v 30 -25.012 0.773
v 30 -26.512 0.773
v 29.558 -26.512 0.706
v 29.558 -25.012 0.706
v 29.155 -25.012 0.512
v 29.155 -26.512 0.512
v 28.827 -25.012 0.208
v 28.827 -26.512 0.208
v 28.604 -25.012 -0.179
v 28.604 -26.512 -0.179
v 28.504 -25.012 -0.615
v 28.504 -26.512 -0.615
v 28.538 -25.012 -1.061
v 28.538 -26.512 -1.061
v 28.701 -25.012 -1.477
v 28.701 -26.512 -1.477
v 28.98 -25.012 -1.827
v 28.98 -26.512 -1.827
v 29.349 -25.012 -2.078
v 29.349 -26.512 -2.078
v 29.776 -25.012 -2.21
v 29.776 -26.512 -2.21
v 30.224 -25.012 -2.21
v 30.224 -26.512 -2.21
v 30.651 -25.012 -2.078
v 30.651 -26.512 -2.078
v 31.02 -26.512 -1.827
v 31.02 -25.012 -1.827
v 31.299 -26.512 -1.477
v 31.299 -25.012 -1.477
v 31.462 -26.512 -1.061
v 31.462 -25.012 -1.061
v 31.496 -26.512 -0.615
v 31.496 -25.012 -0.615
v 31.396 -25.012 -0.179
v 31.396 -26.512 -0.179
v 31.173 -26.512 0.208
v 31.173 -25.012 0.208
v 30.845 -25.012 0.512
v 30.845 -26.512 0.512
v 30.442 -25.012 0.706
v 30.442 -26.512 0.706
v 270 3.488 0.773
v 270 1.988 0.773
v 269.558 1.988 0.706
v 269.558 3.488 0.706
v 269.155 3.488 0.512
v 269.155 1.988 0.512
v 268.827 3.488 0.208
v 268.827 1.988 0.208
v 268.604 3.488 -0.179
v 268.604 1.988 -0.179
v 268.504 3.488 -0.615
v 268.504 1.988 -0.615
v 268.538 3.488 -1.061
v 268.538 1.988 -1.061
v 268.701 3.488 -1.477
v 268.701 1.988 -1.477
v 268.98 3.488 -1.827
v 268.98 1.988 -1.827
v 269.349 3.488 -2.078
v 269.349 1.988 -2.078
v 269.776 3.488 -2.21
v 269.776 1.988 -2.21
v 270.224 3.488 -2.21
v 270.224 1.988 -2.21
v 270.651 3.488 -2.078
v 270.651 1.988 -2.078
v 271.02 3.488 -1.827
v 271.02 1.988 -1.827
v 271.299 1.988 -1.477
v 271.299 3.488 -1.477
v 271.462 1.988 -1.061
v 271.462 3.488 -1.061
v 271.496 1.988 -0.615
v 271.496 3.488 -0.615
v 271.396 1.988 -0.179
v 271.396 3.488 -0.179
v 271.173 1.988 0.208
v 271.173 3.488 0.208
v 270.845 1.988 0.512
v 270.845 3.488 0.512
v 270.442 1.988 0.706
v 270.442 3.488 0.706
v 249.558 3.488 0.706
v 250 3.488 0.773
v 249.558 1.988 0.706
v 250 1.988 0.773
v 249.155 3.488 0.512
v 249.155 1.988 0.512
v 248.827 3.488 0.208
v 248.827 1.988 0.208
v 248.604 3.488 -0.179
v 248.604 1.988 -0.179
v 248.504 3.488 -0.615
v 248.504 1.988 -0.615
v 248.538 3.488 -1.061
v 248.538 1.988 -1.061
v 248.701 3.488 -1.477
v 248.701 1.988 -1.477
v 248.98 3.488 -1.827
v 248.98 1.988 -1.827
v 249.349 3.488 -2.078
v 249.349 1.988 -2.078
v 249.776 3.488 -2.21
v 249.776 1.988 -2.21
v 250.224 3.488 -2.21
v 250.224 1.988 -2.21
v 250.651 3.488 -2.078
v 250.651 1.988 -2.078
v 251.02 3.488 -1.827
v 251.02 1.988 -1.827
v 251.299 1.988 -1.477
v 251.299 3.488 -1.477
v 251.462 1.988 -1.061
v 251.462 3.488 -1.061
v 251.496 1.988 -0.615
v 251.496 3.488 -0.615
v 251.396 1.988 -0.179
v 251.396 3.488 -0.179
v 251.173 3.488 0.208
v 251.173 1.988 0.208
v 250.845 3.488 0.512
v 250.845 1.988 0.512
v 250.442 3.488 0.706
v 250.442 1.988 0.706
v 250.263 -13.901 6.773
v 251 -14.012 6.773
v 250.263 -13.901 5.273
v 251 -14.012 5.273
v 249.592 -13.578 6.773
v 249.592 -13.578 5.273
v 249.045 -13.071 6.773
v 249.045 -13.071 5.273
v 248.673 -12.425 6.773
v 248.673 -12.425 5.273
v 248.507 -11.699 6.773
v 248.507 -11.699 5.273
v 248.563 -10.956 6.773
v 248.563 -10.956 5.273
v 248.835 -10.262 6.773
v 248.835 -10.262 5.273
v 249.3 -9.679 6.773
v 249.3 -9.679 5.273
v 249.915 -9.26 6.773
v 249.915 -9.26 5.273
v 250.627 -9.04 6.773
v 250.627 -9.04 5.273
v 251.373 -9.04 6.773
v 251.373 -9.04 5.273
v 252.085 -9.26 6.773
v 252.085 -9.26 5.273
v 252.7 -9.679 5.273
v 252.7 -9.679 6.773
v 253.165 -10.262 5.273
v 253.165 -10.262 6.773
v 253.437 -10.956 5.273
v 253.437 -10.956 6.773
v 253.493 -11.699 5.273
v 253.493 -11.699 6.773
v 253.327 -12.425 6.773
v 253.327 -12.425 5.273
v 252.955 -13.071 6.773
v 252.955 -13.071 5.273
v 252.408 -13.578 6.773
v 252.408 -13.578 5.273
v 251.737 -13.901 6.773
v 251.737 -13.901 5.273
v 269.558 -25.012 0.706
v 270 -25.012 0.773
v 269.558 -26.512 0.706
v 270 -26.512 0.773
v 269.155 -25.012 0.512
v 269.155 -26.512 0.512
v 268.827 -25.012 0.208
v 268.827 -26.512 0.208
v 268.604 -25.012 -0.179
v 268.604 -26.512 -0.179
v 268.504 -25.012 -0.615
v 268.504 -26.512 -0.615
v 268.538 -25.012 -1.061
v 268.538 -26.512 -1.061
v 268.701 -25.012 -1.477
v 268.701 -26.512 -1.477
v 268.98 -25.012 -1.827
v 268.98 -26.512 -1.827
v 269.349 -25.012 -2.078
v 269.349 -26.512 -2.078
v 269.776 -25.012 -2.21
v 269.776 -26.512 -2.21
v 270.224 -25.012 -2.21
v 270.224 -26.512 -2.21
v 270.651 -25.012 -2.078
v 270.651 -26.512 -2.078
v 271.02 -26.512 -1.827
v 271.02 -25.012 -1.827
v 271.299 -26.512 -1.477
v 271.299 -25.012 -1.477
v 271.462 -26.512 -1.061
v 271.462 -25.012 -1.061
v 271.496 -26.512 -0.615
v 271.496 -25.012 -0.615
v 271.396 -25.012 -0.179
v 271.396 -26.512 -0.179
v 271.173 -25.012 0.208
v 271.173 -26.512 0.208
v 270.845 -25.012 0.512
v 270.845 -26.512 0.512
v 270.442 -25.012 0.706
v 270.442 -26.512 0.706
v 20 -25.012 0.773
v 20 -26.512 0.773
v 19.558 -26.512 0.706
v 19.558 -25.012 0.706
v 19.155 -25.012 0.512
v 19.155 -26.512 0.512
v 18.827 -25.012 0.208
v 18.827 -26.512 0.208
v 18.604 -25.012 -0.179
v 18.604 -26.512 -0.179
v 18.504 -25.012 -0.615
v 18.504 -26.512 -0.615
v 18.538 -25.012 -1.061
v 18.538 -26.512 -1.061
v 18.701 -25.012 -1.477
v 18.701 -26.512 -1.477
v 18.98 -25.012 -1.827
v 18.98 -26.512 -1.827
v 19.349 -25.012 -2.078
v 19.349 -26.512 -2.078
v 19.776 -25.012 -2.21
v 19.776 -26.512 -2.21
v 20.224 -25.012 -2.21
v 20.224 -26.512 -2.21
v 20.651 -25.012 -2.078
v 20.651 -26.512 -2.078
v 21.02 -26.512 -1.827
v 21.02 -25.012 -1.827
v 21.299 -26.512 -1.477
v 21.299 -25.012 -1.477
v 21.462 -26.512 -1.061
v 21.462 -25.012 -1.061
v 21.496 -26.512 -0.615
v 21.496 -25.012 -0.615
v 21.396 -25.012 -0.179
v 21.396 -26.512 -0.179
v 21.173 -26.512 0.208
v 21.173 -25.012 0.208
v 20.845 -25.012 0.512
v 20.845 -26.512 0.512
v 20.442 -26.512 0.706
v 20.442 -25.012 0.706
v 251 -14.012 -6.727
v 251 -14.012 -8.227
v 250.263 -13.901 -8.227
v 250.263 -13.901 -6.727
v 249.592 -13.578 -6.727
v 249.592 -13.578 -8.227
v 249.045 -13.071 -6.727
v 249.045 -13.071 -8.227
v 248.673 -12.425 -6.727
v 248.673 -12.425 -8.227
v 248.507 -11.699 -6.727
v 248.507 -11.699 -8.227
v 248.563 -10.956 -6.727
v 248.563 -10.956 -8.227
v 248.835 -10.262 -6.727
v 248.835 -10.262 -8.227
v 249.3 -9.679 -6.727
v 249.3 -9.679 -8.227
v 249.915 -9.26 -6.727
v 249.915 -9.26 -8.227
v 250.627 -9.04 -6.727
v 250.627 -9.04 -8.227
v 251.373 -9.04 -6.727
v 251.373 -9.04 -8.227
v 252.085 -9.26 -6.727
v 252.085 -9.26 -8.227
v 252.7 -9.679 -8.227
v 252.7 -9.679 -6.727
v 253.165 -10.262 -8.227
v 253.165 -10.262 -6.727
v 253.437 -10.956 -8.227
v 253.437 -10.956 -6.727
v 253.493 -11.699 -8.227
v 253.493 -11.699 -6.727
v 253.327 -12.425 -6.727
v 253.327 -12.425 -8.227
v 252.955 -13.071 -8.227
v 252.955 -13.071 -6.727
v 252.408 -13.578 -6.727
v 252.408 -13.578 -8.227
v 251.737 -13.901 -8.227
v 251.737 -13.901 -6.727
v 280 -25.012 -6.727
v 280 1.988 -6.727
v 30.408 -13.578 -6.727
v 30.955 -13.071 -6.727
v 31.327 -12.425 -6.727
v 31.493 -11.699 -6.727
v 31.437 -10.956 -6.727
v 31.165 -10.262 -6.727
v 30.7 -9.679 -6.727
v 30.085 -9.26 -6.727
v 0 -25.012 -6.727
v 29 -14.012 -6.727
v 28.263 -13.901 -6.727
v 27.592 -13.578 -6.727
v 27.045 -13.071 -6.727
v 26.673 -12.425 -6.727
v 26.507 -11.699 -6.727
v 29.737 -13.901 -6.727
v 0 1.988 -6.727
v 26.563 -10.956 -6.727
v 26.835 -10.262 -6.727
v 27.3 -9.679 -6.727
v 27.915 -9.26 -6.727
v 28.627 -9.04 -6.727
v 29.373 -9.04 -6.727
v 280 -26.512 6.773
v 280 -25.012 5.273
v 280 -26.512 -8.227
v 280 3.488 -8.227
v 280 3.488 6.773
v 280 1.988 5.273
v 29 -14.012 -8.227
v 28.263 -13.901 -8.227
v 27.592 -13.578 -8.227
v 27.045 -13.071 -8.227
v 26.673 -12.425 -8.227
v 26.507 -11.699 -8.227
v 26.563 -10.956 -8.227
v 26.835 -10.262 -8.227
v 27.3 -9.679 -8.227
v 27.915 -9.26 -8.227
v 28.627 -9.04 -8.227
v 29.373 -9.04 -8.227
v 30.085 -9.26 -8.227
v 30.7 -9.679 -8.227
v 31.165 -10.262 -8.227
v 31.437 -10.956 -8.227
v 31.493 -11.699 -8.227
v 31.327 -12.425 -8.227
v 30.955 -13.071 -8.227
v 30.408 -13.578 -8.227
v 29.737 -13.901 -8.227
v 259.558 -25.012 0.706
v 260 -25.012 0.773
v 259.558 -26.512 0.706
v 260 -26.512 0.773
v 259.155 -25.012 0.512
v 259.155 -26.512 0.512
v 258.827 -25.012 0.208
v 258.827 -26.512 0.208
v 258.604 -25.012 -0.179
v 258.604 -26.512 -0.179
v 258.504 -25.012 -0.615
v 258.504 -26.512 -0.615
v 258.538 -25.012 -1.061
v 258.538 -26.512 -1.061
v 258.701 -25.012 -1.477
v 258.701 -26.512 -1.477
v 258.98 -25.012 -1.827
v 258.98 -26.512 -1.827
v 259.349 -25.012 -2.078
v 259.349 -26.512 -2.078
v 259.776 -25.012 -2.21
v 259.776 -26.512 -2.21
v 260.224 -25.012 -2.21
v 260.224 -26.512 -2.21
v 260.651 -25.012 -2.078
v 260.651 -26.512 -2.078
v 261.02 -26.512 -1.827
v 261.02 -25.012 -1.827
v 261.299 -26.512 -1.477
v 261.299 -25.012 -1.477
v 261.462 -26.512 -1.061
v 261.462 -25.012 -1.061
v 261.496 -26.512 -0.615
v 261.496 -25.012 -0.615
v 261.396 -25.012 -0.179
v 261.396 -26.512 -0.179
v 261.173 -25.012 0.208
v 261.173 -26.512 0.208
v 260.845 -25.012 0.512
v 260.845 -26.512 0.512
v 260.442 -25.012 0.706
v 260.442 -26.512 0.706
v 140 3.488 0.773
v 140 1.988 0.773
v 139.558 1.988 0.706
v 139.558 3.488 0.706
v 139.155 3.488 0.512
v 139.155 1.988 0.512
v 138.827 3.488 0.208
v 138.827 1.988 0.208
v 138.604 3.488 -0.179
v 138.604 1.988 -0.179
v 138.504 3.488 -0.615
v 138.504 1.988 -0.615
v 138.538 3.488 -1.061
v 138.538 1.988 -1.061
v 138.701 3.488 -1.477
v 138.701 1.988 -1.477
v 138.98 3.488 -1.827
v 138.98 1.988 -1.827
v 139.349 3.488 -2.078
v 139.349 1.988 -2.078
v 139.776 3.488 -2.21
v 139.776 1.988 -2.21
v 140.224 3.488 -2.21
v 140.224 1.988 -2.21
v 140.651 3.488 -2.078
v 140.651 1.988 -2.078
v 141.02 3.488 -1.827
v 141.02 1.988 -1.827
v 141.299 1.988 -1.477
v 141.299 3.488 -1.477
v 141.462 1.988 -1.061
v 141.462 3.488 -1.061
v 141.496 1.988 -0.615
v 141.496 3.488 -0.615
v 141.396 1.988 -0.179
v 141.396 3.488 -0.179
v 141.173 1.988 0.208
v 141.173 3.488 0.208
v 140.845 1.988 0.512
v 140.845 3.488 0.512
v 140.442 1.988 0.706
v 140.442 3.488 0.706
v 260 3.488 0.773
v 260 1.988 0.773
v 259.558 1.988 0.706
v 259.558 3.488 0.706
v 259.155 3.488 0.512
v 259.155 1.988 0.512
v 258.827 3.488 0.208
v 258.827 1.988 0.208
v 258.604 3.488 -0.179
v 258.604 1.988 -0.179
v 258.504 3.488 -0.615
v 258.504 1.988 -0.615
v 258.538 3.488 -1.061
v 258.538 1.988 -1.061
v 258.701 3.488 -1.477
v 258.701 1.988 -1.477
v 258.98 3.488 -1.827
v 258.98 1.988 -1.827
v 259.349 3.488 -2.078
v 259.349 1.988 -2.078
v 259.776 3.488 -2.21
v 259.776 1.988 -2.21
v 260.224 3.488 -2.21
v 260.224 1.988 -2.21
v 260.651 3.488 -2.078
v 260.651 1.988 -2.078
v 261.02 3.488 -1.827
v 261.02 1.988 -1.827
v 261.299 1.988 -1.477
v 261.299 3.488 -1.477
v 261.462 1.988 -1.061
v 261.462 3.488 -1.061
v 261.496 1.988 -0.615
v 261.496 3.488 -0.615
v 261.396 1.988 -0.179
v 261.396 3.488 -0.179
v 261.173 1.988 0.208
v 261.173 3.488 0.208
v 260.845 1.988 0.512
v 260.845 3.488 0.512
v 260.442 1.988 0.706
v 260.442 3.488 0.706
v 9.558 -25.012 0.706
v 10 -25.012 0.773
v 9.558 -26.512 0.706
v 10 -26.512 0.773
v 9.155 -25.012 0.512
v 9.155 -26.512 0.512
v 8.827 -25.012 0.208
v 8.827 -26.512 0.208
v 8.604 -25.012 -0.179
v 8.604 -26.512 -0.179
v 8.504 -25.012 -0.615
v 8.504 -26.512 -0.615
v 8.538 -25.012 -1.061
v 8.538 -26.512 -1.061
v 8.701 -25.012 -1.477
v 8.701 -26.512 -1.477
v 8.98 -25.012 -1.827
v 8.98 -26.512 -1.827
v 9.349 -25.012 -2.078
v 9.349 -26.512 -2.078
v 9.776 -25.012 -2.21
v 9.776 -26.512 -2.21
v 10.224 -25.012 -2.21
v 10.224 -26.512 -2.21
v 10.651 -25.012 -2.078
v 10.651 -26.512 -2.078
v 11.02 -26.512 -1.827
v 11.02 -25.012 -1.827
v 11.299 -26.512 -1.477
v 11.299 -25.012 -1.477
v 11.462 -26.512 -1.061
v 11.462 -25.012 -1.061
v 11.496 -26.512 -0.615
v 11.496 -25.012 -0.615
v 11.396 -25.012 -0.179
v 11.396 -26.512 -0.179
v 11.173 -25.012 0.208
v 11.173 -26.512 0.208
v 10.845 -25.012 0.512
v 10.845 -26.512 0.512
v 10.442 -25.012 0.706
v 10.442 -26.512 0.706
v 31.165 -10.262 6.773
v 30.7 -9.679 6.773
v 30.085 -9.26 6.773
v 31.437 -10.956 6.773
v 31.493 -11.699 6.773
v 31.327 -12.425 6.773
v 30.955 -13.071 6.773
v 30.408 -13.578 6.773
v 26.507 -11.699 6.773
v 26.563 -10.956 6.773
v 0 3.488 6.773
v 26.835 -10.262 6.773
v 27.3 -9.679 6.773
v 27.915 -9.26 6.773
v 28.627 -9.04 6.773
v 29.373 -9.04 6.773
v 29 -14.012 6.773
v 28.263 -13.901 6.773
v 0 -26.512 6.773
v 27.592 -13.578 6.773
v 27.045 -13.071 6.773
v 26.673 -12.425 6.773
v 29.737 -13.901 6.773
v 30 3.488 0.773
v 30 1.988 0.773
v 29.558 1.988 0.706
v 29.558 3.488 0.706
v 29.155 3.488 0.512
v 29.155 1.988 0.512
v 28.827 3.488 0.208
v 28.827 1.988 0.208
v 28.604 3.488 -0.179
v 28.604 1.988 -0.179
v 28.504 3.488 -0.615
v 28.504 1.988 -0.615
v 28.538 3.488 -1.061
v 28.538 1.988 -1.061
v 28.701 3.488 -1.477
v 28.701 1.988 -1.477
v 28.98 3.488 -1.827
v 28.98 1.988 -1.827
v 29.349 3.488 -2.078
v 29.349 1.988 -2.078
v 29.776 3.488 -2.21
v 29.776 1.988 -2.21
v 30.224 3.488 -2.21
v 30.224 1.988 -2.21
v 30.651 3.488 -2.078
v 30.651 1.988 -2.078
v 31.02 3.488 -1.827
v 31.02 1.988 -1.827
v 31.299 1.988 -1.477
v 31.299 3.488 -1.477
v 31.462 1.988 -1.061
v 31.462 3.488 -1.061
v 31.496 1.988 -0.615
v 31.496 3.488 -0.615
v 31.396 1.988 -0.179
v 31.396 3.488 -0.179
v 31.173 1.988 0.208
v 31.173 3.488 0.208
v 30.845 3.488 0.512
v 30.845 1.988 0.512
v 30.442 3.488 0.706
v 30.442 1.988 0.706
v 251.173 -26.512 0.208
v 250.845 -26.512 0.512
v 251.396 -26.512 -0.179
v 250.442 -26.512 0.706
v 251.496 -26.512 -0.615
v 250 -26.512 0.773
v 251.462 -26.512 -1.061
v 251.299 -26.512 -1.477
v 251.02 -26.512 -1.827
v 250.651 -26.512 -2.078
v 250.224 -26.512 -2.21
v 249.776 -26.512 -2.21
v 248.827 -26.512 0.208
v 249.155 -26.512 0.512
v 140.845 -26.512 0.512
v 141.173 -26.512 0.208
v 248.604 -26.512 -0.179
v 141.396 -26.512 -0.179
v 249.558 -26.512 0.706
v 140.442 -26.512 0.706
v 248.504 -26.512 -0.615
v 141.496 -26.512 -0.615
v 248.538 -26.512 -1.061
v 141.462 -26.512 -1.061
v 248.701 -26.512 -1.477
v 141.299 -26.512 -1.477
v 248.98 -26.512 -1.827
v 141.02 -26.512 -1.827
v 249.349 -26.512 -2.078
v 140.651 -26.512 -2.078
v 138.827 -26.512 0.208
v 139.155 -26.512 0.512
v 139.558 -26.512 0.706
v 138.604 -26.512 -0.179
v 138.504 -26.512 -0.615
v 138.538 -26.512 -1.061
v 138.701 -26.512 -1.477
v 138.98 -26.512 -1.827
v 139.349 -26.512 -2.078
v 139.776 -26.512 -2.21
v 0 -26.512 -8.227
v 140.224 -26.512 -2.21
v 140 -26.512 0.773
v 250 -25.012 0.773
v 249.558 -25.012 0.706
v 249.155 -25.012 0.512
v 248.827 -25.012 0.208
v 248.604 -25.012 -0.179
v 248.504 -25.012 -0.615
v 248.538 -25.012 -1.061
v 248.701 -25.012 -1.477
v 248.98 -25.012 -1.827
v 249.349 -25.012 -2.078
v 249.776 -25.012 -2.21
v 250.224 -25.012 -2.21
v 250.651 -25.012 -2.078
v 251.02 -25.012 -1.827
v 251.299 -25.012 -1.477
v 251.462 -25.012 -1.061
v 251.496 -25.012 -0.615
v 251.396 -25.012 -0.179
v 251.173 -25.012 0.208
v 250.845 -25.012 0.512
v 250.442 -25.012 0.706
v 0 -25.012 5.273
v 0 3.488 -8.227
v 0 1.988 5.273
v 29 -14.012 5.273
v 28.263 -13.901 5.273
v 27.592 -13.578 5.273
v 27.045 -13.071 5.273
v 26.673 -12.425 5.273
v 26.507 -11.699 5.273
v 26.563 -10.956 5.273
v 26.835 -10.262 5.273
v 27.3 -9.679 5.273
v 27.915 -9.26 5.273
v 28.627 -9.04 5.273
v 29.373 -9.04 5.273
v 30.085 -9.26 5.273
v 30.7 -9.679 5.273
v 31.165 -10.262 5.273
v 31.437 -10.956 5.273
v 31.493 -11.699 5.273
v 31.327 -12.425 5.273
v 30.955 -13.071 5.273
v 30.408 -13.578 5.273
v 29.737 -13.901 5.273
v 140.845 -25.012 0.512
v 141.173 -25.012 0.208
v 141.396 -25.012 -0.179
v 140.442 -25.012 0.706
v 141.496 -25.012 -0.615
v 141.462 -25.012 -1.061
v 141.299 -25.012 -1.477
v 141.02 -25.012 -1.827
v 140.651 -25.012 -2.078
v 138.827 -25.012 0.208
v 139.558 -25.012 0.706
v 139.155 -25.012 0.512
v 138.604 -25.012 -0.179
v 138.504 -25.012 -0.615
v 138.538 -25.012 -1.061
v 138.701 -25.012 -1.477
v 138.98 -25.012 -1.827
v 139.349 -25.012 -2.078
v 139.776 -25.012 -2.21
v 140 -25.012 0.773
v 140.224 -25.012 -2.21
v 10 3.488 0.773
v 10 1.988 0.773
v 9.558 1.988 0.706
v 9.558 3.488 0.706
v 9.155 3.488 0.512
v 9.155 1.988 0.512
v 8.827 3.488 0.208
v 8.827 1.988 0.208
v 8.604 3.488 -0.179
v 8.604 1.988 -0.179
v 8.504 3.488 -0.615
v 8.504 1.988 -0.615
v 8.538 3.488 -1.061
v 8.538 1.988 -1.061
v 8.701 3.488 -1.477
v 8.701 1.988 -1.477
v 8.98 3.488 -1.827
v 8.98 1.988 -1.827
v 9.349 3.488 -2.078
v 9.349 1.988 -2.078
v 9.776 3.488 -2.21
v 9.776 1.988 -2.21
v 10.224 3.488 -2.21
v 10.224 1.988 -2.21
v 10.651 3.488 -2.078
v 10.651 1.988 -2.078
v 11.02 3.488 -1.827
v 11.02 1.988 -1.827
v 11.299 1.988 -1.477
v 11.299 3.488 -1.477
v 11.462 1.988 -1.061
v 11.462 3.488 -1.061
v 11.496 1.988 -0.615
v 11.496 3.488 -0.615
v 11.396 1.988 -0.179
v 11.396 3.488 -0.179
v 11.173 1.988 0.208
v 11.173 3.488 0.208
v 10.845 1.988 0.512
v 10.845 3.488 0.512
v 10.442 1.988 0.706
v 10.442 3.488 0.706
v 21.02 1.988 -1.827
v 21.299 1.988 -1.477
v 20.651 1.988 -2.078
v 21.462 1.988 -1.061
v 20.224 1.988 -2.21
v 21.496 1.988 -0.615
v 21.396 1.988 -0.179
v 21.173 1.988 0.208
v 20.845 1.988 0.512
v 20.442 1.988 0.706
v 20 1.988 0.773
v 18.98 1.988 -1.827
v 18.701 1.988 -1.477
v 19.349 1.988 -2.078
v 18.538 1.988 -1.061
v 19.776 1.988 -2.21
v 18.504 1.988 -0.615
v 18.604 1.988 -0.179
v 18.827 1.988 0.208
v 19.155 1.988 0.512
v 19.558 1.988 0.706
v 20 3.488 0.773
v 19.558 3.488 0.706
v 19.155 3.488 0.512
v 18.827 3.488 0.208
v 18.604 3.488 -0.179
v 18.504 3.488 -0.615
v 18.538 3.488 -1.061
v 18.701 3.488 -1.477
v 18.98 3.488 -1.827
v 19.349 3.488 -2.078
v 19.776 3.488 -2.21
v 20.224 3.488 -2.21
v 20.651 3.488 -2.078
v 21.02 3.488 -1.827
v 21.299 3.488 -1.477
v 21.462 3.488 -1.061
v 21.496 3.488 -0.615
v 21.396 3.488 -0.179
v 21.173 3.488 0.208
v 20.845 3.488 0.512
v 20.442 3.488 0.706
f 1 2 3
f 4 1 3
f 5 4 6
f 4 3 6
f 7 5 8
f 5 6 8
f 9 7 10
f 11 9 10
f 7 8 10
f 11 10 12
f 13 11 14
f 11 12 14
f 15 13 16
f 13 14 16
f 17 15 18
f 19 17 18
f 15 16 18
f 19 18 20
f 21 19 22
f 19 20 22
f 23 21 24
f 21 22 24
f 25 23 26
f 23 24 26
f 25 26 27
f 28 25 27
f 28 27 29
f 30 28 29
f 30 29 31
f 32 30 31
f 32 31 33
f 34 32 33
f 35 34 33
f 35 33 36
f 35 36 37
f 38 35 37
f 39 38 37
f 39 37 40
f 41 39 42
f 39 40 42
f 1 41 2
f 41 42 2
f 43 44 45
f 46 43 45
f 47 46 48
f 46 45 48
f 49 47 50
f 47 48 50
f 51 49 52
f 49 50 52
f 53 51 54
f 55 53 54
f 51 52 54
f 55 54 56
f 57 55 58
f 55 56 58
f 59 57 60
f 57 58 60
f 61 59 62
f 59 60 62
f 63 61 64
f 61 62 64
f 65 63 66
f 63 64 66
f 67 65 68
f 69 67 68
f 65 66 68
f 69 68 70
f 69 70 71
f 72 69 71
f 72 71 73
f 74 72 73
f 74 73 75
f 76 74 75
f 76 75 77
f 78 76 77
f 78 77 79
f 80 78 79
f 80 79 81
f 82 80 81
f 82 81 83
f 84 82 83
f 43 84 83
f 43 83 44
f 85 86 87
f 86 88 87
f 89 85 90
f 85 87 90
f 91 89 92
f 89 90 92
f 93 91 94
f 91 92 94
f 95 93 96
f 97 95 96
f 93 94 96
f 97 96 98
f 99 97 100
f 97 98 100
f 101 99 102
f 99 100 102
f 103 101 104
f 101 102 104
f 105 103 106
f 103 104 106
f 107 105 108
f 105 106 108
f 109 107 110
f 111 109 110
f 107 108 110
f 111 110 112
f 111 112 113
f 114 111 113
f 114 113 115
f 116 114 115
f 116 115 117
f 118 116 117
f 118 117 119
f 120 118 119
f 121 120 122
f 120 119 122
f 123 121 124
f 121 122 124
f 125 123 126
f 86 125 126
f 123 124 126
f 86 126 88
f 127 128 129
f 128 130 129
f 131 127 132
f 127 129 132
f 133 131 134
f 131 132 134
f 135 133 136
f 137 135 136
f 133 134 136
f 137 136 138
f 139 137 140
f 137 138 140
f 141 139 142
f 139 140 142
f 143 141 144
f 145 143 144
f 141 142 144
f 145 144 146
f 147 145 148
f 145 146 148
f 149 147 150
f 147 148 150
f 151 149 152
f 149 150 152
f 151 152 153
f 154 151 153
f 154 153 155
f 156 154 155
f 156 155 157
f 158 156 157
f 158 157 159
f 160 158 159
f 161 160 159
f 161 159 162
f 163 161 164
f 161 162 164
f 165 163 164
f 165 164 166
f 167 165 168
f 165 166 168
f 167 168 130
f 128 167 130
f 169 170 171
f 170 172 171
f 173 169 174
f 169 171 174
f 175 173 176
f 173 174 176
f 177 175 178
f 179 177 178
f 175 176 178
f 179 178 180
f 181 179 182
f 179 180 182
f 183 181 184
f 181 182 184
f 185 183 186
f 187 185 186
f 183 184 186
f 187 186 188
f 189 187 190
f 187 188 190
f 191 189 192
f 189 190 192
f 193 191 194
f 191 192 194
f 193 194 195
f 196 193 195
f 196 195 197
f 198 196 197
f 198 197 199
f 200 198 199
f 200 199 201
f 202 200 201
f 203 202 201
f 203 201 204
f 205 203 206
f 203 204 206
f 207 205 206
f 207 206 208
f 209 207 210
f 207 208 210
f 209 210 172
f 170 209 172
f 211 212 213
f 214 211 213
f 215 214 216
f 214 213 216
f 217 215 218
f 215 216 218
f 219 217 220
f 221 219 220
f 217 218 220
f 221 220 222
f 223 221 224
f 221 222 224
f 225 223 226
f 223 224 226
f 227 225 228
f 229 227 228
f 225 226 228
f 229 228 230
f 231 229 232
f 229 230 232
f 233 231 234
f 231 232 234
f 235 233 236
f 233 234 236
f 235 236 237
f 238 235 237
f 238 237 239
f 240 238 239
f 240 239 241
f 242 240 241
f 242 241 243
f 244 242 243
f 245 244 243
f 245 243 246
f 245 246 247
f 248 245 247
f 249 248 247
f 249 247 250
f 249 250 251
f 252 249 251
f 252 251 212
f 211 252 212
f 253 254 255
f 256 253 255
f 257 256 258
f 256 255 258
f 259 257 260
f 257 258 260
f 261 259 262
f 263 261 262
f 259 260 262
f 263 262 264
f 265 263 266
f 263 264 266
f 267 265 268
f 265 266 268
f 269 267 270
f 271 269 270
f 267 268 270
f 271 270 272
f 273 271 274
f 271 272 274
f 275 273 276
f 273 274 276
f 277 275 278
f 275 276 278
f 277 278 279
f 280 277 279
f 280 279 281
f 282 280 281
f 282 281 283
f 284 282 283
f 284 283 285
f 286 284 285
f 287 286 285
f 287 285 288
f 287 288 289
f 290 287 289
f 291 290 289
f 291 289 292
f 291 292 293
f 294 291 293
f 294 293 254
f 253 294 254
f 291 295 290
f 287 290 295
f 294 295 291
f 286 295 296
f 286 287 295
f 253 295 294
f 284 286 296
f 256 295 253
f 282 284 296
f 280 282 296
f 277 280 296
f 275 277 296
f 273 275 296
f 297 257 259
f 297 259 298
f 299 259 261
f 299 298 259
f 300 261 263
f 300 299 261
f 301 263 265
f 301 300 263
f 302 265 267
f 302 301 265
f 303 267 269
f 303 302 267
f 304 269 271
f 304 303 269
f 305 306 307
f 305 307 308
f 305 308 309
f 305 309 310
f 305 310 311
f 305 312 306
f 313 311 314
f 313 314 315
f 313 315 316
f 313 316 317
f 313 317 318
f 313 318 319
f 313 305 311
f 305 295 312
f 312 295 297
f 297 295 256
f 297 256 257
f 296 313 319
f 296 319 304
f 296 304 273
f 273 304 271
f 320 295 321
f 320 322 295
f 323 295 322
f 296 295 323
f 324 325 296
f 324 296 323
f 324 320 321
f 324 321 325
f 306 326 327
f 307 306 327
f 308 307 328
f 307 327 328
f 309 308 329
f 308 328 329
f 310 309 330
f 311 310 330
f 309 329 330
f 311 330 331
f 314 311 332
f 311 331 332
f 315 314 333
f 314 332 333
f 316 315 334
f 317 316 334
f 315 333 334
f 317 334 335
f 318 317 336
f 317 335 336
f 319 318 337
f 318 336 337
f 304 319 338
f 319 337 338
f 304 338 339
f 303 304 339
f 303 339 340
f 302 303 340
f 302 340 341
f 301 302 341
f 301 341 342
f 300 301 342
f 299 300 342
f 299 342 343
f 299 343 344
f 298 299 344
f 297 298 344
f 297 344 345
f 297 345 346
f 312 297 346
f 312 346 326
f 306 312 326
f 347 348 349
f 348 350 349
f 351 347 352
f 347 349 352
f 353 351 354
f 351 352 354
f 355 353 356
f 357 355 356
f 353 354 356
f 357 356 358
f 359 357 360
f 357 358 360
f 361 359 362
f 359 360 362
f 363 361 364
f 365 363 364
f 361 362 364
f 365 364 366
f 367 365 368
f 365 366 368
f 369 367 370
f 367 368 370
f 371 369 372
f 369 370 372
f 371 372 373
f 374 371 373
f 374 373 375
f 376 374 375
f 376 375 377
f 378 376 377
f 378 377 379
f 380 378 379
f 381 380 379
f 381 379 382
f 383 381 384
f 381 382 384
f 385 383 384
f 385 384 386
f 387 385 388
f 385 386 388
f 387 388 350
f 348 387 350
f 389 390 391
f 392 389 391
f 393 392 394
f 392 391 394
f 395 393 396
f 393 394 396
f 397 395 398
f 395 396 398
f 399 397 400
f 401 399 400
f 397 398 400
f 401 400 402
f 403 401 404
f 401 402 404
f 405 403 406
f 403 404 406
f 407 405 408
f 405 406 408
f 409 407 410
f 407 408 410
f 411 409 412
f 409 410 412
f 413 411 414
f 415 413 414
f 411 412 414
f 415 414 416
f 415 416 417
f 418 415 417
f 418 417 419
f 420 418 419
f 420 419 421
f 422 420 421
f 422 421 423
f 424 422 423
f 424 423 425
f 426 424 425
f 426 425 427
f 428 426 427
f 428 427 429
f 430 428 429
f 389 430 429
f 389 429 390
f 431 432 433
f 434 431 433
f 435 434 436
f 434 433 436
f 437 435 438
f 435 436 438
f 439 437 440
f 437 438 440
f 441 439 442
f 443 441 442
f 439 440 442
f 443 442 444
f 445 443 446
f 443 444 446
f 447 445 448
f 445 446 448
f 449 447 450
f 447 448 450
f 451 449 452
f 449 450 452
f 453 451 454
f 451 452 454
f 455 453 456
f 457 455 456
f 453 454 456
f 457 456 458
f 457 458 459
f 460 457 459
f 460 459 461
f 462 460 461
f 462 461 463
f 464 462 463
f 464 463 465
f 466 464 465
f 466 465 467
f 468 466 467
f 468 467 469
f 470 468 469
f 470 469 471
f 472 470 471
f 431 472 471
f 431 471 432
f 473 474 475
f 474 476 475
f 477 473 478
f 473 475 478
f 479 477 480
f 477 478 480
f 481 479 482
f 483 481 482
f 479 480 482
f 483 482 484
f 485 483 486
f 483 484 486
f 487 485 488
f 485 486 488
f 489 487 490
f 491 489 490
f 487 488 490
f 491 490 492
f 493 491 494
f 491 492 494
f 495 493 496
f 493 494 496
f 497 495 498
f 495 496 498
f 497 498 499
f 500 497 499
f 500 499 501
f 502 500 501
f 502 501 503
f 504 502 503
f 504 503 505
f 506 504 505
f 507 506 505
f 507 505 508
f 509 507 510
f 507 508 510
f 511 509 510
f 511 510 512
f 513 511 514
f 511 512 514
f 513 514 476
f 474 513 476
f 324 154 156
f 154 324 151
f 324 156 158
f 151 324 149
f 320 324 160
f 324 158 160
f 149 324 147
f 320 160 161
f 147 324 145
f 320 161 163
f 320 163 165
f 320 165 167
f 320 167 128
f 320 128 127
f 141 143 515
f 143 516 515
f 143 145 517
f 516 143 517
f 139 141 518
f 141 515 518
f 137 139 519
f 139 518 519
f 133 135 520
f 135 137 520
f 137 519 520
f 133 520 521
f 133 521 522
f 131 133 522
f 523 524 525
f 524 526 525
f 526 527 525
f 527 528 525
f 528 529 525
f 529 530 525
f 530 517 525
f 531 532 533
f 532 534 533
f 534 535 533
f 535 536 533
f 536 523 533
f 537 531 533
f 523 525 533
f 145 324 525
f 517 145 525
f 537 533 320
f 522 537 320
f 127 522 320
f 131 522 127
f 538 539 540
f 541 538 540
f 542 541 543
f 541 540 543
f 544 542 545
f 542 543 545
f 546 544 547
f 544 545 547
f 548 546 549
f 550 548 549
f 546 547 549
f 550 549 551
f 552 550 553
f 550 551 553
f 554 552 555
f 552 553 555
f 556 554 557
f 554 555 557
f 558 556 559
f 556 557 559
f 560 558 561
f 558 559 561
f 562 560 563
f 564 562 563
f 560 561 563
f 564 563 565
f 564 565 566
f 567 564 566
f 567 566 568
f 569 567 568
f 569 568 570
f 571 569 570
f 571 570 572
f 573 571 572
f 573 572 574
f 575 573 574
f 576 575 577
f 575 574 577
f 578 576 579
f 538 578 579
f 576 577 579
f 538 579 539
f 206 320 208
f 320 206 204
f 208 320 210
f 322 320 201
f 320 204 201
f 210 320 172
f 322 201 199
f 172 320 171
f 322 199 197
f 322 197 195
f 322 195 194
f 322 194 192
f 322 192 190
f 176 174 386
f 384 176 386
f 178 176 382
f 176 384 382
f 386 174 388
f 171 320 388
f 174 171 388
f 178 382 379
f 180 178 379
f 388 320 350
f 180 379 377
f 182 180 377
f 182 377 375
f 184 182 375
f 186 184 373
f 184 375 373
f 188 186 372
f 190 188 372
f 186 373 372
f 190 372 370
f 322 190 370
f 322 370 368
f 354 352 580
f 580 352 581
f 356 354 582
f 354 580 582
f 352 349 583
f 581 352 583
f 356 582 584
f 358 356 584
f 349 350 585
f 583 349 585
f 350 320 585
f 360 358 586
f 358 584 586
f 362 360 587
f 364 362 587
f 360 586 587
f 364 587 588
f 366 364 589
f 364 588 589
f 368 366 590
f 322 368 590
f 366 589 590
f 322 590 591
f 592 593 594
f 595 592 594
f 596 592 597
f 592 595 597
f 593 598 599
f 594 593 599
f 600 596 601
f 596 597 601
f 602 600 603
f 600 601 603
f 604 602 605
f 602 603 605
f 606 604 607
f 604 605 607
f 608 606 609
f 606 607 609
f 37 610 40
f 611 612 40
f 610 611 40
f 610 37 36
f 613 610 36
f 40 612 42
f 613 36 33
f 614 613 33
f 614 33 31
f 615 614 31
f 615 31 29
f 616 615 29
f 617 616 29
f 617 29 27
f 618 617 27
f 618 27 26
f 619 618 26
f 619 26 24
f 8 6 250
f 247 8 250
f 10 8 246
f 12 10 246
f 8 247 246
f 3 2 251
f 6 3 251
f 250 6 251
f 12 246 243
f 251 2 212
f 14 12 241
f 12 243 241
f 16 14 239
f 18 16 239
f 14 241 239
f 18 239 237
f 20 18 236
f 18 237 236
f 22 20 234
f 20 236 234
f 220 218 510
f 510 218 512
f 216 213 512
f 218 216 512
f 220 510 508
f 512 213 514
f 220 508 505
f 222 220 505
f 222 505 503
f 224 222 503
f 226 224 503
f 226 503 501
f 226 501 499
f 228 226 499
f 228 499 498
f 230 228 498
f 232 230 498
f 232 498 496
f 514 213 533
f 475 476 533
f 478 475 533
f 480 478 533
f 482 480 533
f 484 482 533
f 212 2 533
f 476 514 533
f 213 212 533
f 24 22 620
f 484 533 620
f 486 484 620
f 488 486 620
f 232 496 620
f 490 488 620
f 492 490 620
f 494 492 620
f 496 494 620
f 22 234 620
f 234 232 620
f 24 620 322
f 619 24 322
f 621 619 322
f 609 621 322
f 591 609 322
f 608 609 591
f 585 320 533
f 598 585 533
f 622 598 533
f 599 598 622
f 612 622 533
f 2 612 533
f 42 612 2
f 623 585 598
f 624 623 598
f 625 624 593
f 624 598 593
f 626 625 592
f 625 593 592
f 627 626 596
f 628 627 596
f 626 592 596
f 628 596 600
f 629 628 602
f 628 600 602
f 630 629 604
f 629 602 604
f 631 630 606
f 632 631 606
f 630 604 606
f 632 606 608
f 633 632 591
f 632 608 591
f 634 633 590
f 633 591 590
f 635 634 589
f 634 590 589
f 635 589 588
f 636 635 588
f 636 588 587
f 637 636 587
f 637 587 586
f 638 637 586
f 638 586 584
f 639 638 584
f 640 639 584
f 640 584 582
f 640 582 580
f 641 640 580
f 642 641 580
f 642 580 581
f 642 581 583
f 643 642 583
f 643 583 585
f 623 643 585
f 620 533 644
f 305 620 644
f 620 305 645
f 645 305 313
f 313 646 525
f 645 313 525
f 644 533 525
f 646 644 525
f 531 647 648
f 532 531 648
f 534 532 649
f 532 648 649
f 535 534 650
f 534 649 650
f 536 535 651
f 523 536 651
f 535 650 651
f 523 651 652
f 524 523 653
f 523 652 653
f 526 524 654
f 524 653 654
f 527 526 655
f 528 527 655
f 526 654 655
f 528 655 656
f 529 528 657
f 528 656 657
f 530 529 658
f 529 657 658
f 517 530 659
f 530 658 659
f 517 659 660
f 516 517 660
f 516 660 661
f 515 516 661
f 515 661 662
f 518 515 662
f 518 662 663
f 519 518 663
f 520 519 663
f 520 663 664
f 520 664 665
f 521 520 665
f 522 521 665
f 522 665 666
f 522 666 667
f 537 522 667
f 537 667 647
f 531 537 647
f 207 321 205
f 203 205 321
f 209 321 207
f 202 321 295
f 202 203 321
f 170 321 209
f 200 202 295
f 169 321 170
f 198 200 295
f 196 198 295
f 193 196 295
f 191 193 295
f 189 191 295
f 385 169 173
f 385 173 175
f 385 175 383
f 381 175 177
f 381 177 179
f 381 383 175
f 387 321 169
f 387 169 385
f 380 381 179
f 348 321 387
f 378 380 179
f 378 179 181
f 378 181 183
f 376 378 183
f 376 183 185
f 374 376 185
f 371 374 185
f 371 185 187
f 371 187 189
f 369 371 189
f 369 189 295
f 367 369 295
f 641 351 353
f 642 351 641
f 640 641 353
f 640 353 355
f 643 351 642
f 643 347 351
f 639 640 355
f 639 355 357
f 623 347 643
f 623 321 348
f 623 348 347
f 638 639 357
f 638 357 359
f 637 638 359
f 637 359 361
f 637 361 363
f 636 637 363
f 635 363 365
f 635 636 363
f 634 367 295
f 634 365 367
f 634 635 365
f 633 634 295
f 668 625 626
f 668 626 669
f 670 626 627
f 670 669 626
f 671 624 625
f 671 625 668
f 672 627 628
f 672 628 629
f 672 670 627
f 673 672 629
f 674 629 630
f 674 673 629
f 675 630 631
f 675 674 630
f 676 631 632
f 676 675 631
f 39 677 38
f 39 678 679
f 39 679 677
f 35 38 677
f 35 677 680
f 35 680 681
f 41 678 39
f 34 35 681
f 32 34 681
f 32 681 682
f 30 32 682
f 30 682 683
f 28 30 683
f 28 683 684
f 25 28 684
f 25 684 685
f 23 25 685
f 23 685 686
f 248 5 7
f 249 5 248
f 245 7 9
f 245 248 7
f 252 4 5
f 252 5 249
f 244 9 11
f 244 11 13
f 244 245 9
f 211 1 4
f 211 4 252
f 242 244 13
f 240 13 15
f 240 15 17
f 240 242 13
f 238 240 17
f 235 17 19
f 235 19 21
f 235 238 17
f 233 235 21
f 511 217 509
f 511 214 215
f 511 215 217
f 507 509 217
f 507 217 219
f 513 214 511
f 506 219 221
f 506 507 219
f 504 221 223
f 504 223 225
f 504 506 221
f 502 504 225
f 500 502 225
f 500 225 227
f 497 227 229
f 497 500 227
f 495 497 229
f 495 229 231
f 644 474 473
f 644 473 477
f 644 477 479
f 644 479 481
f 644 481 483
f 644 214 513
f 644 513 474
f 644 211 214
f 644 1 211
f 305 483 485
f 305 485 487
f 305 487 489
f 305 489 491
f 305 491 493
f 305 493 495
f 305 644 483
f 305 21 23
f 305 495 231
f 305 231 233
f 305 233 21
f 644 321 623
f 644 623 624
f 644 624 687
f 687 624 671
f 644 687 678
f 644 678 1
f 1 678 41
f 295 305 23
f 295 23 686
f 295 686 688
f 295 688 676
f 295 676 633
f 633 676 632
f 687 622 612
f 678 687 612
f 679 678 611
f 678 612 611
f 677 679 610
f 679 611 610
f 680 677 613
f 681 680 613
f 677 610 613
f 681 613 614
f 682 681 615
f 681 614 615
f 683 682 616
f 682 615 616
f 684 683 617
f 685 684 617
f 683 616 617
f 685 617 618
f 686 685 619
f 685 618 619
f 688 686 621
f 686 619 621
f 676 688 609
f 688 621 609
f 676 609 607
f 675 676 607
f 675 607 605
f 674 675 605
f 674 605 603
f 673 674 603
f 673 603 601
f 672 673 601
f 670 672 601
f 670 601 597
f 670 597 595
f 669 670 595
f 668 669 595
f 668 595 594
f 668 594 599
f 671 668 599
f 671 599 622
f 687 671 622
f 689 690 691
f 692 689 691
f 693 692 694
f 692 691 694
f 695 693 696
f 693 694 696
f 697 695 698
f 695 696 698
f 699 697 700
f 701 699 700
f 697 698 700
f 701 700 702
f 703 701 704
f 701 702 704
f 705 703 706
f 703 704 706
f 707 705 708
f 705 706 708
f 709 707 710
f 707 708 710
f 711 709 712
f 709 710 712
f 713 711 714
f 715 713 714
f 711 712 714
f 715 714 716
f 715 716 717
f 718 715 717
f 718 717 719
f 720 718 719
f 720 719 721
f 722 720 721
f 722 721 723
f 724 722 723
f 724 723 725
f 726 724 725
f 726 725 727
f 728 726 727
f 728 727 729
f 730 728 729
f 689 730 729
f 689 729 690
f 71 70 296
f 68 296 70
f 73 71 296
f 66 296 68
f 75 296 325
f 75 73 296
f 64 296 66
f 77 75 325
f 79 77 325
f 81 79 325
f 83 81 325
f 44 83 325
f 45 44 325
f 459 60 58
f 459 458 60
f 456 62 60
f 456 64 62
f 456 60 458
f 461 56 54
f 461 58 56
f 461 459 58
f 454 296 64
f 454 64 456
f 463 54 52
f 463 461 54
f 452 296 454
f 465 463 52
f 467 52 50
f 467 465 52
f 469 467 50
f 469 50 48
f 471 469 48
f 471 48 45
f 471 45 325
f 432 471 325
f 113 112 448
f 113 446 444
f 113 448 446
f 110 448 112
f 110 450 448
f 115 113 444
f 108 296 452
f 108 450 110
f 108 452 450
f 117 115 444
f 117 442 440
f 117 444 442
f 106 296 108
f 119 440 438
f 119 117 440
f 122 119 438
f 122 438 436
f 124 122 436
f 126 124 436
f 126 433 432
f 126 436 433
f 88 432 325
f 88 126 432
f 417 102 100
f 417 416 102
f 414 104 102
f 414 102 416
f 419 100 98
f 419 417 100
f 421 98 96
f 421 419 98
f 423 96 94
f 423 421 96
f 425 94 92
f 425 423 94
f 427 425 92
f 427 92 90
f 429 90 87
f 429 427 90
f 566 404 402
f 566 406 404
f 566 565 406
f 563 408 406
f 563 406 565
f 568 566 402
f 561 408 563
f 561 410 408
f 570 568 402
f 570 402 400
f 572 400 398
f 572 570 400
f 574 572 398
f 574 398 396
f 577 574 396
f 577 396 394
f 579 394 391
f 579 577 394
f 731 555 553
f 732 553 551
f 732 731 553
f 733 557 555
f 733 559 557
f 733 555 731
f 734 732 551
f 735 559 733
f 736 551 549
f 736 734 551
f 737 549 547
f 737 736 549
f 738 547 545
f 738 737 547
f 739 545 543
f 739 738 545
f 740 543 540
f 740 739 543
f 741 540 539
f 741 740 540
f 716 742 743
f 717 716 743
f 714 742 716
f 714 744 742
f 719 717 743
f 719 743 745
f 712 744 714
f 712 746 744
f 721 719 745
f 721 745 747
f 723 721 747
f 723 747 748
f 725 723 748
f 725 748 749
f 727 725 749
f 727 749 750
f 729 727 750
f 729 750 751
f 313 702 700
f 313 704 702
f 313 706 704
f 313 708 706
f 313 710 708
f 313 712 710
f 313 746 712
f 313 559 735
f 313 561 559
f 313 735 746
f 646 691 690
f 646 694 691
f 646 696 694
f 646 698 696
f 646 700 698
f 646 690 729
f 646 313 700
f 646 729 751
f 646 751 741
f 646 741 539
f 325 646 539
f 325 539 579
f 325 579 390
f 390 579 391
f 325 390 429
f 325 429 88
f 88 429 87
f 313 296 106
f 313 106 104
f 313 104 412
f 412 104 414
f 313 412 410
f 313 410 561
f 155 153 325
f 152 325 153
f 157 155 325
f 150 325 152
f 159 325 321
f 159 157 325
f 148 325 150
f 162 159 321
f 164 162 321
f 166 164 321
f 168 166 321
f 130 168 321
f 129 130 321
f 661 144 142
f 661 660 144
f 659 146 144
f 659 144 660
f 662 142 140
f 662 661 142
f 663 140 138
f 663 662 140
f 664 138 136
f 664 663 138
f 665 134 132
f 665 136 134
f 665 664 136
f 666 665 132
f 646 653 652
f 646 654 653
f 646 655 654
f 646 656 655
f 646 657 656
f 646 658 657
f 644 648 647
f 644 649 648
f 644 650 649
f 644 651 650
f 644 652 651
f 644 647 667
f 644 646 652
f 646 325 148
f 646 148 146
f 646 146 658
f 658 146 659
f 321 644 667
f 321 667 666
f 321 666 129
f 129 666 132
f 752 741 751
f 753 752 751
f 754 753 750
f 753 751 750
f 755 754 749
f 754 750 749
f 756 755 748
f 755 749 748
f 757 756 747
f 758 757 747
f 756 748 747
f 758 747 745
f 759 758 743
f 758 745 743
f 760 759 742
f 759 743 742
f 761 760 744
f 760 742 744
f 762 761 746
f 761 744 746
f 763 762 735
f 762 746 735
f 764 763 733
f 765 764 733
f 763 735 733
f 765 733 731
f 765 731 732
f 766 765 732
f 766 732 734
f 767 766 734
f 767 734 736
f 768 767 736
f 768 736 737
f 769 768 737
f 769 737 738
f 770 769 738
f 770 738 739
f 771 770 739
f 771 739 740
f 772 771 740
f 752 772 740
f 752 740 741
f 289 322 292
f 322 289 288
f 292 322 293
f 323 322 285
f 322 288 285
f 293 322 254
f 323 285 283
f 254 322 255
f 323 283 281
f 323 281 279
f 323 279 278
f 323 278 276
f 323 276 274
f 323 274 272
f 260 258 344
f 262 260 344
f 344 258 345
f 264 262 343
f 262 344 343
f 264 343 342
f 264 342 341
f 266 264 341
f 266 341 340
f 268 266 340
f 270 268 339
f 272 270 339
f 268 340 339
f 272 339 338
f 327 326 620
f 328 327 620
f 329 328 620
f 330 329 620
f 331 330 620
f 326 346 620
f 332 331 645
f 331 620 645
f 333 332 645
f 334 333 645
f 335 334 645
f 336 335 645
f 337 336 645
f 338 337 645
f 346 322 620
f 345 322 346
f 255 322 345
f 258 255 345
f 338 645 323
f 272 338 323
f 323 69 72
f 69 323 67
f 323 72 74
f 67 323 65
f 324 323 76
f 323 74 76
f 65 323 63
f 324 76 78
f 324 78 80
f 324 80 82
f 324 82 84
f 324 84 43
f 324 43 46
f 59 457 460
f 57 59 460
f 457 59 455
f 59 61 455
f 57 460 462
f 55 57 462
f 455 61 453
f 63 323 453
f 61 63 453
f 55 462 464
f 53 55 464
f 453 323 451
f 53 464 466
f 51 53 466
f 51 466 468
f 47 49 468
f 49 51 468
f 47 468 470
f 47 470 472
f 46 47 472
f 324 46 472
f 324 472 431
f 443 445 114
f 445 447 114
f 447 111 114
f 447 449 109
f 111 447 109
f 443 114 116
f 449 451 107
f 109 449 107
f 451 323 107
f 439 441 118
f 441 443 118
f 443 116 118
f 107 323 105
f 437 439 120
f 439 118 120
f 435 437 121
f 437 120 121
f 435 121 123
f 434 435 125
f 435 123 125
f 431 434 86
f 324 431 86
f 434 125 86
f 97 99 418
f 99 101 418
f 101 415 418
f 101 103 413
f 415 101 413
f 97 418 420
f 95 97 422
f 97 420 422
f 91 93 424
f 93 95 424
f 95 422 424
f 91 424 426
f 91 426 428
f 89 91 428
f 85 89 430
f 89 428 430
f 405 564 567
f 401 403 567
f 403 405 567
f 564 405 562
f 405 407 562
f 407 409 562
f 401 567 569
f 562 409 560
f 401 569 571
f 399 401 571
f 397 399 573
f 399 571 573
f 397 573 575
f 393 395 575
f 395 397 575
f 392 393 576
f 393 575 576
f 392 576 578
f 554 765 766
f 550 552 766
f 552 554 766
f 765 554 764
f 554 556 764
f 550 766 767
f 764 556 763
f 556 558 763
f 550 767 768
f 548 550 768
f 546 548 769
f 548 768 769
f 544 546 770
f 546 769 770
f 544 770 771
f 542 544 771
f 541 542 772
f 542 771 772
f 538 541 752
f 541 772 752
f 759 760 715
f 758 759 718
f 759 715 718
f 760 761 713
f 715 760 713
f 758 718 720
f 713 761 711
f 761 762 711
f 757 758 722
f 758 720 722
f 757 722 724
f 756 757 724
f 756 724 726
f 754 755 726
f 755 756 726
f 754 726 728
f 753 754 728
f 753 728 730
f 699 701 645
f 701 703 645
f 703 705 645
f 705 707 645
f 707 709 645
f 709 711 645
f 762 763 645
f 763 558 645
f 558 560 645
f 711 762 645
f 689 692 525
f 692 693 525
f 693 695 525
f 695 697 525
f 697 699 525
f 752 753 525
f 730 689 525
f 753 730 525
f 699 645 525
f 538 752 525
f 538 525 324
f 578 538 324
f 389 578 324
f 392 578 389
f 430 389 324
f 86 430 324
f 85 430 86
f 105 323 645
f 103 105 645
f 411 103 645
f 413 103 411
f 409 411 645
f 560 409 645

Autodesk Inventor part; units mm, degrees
ref_plane "YZ Plane" through (0, 0, 0) normal (1, 0, 0) x (0, 1, 0)
ref_plane "XZ Plane" through (0, 0, 0) normal (0, 1, 0) x (-1, 0, 0)
ref_plane "XY Plane" through (0, 0, 0) normal (0, 0, 1) x (1, 0, 0)
sketch "スケッチ1" plane through (0, 0, 0) normal (1, 0, 0) x (0, 1, 0)
  line L0 (3.4879, 6.773) -> (-26.5121, 6.773)
  line L1 (-26.5121, 6.773) -> (-26.5121, -8.227)
  line L2 (-26.5121, -8.227) -> (3.4879, -8.227)
  line L3 (3.4879, -8.227) -> (3.4879, 6.773)
  point P0 (0, 0)
  dimension "d0" = 30
  dimension "d1" = 15
extrude "押し出し1" add sketch "スケッチ1" along normal blind 280
sketch "スケッチ2" plane through (0, 3.4879, 6.773) normal (0, 1, 0) x (1, 0, 0)
  circle A0 centre (10, 7.5) radius 1.5
  line L0 (0, 15) -> (0, 0) projected
  line L1 (0, 15) -> (280, 15) projected
  circle A1 centre (20, 7.5) radius 1.5
  circle A2 centre (30, 7.5) radius 1.5
  circle A3 centre (270, 7.5) radius 1.5
  line L2 (280, 15) -> (280, 0) projected
  circle A4 centre (260, 7.5) radius 1.5
  circle A5 centre (250, 7.5) radius 1.5
  point P0 (0, 6.773)
  dimension "d4" = 3
  dimension "d5" = 10
  dimension "d6" = 7.5
  dimension "d7" = 3
  dimension "d8" = 3
  dimension "d9" = 10
  dimension "d10" = 10
  dimension "d11" = 3
  dimension "d12" = 10
  dimension "d13" = 3
  dimension "d14" = 3
  dimension "d15" = 10
  dimension "d16" = 10
hole "穴1" at (270, 3.4879, -0.727) at (260, 3.4879, -0.727) at (250, 3.4879, -0.727) at (10, 3.4879, -0.727) at (20, 3.4879, -0.727) at (30, 3.4879, -0.727) direction (0, -1, 0) diameter 3 depth 30
sketch "スケッチ3" plane through (0, 0, 0) normal (-1, 0, 0) x (0, 0, 1)
  line L0 (-6.727, 1.9879) -> (5.273, 1.9879)
  line L1 (5.273, 1.9879) -> (5.273, -25.0121)
  line L2 (5.273, -25.0121) -> (-6.727, -25.0121)
  line L3 (-6.727, -25.0121) -> (-6.727, 1.9879)
  line L4 (-8.227, 3.4879) -> (6.773, 3.4879) projected
  line L5 (-8.227, -26.5121) -> (-8.227, 3.4879) projected
  point P0 (0, 0)
  dimension "d24" = 12
  dimension "d25" = 27
  dimension "d26" = 1.5
  dimension "d27" = 1.5
extrude "押し出し2" cut sketch "スケッチ3" against normal blind 280
sketch "スケッチ4" plane through (0, 3.4879, 6.773) normal (0, 1, 0) x (1, 0, 0)
  circle A0 centre (140, 7.5) radius 1.5
  line L0 (0, 0) -> (280, 0) projected
  line L1 (0, 15) -> (0, 0) projected
  point P0 (0, 6.773)
  dimension "d30" = 3
  dimension "d31" = 7.5
  dimension "d32" = 140
hole "穴2" at (140, 3.4879, -0.727) direction (0, -1, 0) diameter 3 depth 30
sketch "スケッチ5" plane through (0, -26.5121, 6.773) normal (0, 0, 1) x (1, 0, 0)
  circle A0 centre (29, 15) radius 2.5
  line L0 (0, 30) -> (0, 0) projected
  line L1 (0, 30) -> (280, 30) projected
  point P0 (0, 26.5121)
  dimension "d40" = 5
  dimension "d41" = 29
  dimension "d42" = 15
hole "穴3" at (29, -11.5121, 6.773) direction (0, 0, -1) diameter 5 depth 15
sketch "スケッチ6" plane through (0, -26.5121, 6.773) normal (0, 0, 1) x (1, 0, 0)
  circle A0 centre (251, 15) radius 2.5
  line L0 (280, 30) -> (280, 0) projected
  line L1 (0, 30) -> (280, 30) projected
  point P0 (0, 26.5121)
  dimension "d50" = 5
  dimension "d51" = 29
  dimension "d52" = 15
hole "穴4" at (251, -11.5121, 6.773) direction (0, 0, -1) diameter 5 depth 15
equation "\"BendRadius\" = Thickness"
equation "\"BendReliefWidth\" = Thickness"
equation "\"BendReliefDepth\" = 0.5 * Thickness"
equation "\"CornerReliefSize\" = 4 * Thickness"
equation "\"MinimumRemnant\" = 2 * Thickness"
equation "\"TransitionRadius\" = BendRadius"
equation "\"JacobiRadiusSize\" = BendRadius"
equation "\"GapSize\" = Thickness"
equation "\"Thickness\" = 0.5"
properties part number "nhk18" material "アルミニウム 6061"
